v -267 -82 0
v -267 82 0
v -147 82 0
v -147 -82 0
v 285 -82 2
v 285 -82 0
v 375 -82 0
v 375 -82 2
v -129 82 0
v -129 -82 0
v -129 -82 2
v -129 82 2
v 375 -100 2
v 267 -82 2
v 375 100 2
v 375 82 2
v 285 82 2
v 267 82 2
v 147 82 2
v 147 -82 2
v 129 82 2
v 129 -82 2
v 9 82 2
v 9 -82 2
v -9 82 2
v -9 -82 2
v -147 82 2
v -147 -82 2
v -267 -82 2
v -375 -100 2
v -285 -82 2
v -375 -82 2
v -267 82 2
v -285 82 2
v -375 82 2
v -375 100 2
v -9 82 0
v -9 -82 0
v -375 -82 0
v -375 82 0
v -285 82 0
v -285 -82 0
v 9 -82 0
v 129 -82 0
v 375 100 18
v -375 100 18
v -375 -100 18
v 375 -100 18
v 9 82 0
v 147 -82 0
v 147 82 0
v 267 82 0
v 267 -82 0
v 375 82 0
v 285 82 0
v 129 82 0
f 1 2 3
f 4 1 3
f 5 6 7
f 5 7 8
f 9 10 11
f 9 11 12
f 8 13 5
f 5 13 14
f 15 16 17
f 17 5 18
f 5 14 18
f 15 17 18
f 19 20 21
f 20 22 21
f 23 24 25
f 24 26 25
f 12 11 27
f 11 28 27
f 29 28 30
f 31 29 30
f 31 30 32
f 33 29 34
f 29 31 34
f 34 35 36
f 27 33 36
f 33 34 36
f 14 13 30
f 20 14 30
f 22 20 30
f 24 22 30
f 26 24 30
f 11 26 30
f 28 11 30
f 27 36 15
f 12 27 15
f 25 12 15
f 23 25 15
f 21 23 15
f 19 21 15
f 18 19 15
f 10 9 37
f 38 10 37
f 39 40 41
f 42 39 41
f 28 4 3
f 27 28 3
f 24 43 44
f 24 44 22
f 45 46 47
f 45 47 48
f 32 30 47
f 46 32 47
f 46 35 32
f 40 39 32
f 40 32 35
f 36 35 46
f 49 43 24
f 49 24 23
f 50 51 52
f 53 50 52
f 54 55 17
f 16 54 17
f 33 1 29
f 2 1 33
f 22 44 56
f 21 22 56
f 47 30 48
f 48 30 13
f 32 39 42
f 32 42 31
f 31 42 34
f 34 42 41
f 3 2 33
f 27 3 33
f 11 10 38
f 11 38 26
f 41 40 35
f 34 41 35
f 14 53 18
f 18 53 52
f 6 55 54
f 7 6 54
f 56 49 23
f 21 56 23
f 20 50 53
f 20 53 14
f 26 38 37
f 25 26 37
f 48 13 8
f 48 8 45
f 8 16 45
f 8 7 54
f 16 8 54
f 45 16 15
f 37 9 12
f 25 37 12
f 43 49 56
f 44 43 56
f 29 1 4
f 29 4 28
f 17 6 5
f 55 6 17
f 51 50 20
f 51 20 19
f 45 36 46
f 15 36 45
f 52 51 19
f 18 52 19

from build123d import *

# Parameters (mm, degrees)
SKETCH1_W           = 750
SKETCH1_H           = 200
BOSS_EXTRUDE1_DEPTH = 18
SKETCH2_W           = 2
SKETCH2_H           = 18
CUT_EXTRUDE3_DEPTH  = 757.851372464
SKETCH3_W           = 18
SKETCH3_H           = 328.758100902
SKETCH3_H_2         = 372.829020194
SKETCH3_H_3         = 369.502918338
SKETCH3_H_4         = 384.006512989
SKETCH3_H_5         = 390.144460662
CUT_EXTRUDE4_DEPTH  = 2


with BuildPart() as part:
    # Sketch1 → Boss-Extrude1 (new body)
    with BuildSketch(Plane.XY):
        Rectangle(SKETCH1_W, SKETCH1_H)
    extrude(amount=BOSS_EXTRUDE1_DEPTH)

    # Sketch2 → Cut-Extrude3 (cut, through all)
    with BuildSketch(Plane.ZY.offset(375)):
        with Locations((1, -91)):
            Rectangle(SKETCH2_W, SKETCH2_H)
        with Locations((1, 91)):
            Rectangle(SKETCH2_W, SKETCH2_H)
    extrude(amount=-CUT_EXTRUDE3_DEPTH, mode=Mode.SUBTRACT)

    # Sketch3 → Cut-Extrude4 (cut)
    with BuildSketch(Plane(origin=(0, 0, 0), x_dir=(-1, 0, 0), z_dir=(0, 0, -1))):
        with Locations((276, 27.416436842)):
            Rectangle(SKETCH3_W, SKETCH3_H)
        with Locations((138, 25.675959121)):
            Rectangle(SKETCH3_W, SKETCH3_H_2)
        with Locations((0, 35.637467242)):
            Rectangle(SKETCH3_W, SKETCH3_H_3)
        with Locations((-138, 42.889264568)):
            Rectangle(SKETCH3_W, SKETCH3_H_4)
        with Locations((-276, 58.109616722)):
            Rectangle(SKETCH3_W, SKETCH3_H_5)
    extrude(amount=-CUT_EXTRUDE4_DEPTH, mode=Mode.SUBTRACT)


solid = part.part
